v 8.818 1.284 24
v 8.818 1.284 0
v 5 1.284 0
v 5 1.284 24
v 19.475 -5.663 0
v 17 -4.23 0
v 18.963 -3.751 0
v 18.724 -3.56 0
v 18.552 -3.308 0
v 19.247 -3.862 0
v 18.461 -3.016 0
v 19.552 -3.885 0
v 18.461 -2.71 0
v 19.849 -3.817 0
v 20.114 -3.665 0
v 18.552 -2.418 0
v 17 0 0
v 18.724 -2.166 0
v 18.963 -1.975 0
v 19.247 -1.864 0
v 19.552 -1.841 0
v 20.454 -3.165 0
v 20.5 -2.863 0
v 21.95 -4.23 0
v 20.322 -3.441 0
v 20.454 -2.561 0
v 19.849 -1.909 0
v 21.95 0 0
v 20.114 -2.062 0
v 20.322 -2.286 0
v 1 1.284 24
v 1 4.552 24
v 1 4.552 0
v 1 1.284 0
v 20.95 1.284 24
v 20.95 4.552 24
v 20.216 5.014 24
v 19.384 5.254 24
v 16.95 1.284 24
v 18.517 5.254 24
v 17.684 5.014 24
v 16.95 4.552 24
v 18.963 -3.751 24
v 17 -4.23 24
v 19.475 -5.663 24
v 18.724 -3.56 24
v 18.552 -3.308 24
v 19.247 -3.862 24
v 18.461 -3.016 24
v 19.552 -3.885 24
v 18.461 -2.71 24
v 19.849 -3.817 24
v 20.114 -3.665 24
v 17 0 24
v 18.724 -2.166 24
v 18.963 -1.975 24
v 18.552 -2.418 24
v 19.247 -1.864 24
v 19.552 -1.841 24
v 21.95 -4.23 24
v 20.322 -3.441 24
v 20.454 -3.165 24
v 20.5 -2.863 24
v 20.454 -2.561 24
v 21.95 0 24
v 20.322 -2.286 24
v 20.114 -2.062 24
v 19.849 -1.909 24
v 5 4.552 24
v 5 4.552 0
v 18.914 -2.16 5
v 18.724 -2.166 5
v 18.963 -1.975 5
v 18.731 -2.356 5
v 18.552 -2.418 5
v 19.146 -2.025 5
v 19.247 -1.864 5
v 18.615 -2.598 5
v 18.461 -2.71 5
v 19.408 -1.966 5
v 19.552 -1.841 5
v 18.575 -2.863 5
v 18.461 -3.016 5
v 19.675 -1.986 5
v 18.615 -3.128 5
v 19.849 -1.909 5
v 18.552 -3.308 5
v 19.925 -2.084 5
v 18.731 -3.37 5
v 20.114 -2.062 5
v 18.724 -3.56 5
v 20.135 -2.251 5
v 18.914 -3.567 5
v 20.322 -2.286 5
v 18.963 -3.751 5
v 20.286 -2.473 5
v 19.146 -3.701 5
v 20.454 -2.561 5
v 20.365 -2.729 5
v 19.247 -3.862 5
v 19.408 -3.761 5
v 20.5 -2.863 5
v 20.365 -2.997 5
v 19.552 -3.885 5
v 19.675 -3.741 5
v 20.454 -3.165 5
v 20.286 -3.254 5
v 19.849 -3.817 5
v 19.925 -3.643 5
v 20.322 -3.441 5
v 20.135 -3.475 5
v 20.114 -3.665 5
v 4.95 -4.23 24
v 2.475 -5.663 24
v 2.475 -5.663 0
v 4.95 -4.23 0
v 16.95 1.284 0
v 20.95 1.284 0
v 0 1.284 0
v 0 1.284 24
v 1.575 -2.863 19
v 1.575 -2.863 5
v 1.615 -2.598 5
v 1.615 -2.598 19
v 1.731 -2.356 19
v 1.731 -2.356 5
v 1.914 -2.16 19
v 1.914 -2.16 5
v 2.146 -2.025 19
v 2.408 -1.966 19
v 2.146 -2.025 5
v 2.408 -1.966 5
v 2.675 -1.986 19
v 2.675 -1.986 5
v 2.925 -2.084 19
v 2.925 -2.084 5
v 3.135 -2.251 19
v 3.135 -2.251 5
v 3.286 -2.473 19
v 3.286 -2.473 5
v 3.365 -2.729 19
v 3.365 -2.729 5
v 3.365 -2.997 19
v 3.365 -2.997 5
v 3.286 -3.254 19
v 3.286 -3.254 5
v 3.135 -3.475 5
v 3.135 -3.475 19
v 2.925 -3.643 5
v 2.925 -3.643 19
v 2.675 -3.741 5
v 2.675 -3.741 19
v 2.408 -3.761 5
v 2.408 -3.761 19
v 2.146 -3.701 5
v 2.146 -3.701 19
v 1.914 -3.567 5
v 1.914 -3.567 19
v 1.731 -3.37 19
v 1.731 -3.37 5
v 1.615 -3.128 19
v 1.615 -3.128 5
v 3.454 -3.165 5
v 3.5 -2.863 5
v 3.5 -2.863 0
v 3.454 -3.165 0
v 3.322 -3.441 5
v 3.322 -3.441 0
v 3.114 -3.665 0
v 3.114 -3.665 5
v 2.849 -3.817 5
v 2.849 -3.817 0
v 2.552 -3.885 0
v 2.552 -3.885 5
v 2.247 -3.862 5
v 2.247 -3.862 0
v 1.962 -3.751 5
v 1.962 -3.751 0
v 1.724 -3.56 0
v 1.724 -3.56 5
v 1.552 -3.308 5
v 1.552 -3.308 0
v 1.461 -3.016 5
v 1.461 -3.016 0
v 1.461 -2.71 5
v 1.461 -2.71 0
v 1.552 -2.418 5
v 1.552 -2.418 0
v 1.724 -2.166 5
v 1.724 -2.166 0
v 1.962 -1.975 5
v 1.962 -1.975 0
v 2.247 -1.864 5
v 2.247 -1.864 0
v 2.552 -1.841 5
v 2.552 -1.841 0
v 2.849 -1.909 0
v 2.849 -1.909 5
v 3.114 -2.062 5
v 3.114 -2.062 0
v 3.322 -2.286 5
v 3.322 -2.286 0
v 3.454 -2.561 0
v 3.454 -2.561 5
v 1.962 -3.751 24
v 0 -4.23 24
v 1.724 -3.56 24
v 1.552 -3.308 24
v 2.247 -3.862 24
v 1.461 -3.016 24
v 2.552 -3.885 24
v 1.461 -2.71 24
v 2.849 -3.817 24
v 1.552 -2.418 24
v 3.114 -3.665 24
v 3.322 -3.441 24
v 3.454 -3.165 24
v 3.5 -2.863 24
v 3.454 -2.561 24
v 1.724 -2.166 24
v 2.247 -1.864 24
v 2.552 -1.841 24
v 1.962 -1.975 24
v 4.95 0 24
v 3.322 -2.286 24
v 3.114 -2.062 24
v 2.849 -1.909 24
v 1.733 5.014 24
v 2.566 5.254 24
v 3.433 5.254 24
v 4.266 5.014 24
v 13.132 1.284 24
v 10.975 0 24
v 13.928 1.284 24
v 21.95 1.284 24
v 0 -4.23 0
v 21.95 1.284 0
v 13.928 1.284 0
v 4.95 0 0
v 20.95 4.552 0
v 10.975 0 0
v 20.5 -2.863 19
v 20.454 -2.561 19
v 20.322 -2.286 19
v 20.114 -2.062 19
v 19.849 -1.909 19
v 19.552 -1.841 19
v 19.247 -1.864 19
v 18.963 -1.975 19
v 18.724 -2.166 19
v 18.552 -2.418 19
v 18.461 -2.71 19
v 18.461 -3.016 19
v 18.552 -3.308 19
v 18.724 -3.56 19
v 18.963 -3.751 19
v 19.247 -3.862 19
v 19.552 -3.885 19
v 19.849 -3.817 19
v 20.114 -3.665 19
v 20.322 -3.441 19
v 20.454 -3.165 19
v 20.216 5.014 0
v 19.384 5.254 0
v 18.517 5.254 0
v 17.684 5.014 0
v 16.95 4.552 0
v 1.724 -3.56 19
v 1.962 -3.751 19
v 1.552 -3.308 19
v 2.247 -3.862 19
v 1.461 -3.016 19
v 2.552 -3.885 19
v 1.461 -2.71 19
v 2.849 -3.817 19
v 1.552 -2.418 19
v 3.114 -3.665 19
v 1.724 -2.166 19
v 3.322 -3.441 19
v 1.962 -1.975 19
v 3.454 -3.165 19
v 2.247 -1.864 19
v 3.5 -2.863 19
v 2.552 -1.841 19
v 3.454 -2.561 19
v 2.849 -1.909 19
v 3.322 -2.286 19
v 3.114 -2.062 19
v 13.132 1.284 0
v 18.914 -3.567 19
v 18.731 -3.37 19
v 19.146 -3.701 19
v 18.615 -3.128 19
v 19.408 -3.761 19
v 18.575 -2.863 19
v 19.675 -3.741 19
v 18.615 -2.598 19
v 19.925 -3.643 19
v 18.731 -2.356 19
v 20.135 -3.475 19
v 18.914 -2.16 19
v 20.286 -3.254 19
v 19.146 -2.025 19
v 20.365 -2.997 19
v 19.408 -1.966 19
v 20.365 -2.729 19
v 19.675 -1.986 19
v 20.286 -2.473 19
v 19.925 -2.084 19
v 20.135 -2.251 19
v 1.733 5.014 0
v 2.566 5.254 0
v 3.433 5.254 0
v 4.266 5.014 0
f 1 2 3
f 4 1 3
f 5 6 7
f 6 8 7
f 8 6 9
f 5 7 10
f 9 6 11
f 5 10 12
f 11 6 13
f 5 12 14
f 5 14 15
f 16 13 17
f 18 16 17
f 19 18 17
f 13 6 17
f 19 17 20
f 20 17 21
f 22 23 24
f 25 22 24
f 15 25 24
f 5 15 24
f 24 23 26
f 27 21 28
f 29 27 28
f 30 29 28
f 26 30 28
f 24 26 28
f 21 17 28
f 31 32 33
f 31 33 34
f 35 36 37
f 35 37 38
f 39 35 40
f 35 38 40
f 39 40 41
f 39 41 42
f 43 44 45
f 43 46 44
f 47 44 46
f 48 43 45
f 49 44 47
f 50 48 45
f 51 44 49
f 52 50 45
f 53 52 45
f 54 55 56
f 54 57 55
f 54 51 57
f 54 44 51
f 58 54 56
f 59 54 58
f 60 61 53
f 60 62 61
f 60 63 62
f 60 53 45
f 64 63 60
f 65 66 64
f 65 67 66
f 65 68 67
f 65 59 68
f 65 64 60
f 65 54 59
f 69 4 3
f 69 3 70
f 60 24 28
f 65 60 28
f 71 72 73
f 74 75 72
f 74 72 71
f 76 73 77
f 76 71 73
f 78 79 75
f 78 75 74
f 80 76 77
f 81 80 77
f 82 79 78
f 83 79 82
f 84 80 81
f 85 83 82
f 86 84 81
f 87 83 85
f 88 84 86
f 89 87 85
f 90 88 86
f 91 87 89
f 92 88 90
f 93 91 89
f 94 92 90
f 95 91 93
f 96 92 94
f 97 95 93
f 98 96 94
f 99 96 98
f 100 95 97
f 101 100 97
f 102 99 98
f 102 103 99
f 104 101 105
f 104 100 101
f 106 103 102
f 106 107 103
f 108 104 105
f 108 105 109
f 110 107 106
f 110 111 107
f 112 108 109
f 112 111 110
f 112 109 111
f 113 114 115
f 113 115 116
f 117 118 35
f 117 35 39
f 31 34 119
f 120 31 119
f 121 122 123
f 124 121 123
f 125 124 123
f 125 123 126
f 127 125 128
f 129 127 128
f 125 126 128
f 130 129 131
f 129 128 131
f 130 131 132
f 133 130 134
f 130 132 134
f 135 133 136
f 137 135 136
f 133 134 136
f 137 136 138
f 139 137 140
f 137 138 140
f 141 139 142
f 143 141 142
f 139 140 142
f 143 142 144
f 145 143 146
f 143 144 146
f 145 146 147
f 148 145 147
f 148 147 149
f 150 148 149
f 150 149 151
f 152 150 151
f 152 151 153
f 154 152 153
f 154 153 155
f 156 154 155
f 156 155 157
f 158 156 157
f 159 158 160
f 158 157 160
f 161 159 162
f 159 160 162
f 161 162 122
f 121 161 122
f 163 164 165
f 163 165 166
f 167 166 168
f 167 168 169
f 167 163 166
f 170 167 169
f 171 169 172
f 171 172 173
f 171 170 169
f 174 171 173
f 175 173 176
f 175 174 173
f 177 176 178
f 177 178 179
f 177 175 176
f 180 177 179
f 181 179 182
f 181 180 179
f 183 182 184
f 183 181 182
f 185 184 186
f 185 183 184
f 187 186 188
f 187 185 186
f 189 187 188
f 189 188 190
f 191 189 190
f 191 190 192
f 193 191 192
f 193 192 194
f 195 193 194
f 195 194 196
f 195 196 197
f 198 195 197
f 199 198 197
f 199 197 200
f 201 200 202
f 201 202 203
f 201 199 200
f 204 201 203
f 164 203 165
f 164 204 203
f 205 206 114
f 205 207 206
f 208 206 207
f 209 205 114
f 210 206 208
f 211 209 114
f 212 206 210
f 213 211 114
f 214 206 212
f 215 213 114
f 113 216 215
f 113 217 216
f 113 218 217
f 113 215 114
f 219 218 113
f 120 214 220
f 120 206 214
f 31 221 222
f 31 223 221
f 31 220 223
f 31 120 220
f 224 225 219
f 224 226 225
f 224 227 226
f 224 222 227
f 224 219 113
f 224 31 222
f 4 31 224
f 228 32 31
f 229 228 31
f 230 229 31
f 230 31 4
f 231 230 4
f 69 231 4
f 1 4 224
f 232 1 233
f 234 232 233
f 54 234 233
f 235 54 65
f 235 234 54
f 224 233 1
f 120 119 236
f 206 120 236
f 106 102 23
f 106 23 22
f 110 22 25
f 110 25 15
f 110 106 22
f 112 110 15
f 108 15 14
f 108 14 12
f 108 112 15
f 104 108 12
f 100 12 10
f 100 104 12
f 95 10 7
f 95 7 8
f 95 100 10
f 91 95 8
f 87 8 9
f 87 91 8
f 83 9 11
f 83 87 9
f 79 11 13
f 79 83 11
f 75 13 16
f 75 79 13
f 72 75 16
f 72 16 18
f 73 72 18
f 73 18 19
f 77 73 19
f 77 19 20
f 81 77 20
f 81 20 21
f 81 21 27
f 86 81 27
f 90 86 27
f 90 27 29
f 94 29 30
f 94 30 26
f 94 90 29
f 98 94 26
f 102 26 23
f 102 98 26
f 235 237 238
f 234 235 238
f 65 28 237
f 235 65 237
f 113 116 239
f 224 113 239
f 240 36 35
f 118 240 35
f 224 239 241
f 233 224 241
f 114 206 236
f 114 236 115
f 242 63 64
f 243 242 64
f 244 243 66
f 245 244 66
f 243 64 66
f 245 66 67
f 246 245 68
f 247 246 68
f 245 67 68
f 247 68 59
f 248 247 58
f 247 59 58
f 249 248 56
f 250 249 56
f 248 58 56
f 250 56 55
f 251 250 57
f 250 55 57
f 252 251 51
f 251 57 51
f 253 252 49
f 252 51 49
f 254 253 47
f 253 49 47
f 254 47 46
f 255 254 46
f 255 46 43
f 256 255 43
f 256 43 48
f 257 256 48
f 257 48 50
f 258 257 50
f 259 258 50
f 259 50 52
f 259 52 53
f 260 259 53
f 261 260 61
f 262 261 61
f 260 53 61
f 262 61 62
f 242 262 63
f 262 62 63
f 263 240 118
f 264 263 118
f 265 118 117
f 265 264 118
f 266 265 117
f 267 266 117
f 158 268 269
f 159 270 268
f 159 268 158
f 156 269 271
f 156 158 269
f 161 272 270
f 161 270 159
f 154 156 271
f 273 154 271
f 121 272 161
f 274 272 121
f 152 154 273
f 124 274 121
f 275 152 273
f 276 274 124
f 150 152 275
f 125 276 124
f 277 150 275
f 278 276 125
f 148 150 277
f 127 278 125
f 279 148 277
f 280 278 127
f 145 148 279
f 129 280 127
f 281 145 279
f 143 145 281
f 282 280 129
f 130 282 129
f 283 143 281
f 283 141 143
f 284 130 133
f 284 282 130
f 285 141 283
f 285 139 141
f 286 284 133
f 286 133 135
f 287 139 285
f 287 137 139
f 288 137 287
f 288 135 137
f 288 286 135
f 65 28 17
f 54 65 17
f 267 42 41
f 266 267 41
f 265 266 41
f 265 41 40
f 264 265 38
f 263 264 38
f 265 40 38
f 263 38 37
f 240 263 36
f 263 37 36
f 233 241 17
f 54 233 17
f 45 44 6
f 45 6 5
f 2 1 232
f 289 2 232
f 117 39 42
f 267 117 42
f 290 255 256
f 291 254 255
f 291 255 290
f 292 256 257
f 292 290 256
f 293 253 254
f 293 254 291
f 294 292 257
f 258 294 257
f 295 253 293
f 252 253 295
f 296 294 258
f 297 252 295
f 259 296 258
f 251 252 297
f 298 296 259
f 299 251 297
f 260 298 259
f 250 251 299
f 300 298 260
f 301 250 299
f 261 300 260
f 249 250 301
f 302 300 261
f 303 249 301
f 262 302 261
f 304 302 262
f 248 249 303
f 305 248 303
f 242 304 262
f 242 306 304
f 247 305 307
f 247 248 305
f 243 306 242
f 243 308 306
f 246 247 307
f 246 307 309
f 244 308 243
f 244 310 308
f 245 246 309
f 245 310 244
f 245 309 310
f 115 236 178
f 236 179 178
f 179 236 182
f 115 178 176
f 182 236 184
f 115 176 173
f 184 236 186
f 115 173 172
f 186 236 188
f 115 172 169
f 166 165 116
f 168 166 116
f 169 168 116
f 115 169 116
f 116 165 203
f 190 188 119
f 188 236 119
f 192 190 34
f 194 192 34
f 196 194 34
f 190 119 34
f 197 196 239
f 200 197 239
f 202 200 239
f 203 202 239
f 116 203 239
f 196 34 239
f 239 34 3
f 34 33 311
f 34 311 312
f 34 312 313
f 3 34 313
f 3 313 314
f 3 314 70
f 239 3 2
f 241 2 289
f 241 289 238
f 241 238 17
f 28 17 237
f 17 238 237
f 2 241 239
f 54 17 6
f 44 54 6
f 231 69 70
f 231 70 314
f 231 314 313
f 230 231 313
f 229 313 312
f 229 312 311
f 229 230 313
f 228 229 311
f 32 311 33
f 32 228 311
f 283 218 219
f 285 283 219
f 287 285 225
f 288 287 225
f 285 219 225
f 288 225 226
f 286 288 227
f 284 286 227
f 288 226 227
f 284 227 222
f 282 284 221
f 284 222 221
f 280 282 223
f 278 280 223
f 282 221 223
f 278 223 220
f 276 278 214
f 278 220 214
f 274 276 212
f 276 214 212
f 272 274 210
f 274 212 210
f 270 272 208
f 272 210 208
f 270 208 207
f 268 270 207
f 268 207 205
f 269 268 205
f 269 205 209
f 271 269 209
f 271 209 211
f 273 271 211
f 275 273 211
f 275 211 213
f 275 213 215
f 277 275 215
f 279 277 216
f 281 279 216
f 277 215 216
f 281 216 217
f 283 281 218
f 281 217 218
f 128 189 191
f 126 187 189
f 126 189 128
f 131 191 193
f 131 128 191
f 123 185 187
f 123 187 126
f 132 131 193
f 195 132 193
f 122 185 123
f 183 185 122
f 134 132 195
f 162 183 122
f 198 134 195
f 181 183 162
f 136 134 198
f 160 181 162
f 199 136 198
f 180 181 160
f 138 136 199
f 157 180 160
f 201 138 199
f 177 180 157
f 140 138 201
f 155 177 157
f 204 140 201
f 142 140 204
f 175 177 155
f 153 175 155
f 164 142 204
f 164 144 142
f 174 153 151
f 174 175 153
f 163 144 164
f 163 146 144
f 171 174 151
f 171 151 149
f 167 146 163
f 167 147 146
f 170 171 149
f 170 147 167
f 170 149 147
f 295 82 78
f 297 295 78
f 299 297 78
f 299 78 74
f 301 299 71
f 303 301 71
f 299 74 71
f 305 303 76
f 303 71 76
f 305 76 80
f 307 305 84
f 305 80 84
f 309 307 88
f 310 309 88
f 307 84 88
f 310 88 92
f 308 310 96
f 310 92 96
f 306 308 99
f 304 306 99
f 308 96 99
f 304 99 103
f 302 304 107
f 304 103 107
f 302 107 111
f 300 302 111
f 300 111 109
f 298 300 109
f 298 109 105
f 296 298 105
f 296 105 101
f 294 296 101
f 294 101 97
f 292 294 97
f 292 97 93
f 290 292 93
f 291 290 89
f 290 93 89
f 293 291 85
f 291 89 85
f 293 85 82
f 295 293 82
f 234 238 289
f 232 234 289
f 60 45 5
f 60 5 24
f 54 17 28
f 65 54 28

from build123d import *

# Parameters (mm, degrees)
BOSS_EXTRUDE2_DEPTH   = 24
BOSS_EXTRUDE2_2_DEPTH = 24
SKETCH6_R             = 1.025
CUT_EXTRUDE1_DEPTH    = 5
CUT_EXTRUDE2_START    = -5
SKETCH7_R             = 1.025
CUT_EXTRUDE2_DEPTH    = 5
SKETCH8_R             = 0.9
CUT_EXTRUDE3_DEPTH    = 14
CUT_EXTRUDE4_DEPTH    = 24
BOSS_EXTRUDE3_DEPTH   = 24


with BuildPart() as part:
    # Sketch3 → Boss-Extrude2 (new body)
    with BuildSketch(Plane.XY):
        with BuildLine():
            Line((0, 1.284473501), (0, -4.23))
            Line((0, -4.23), (2.475, -5.663169564))
            Line((2.475, -5.663169564), (4.95, -4.23))
            Line((4.95, -4.23), (4.95, 0))
            Line((4.95, 0), (10.974918748, 0))
            Line((10.974918748, 0), (17, -0.000257875))
            Line((17, -0.000257875), (17, 0))
            Line((17, 0), (21.949837505, 0))
            Line((21.949837505, 0), (21.949892461, 1.28400377))
            Line((21.949892461, 1.28400377), (13.928131848, 1.284347104))
            Line((13.928131848, 1.284347104), (13.13155756, 1.284381197))
            Line((13.13155756, 1.284381197), (12.329651428, 1.886055123))
            ThreePointArc((12.329651428, 1.886055123), (12.474649771, 2.499007586), (12.355214929, 3.117449627))
            ThreePointArc((12.355214929, 3.117449627), (10.359172253, 3.897908673), (9.620266793, 1.886113105))
            Line((9.620266793, 1.886113105), (8.81833491, 1.284473501))
            Line((8.81833491, 1.284473501), (0, 1.284473501))
        make_face()
    extrude(amount=BOSS_EXTRUDE2_DEPTH)


with BuildPart() as body_2:
    # Sketch3 → Boss-Extrude2 2 (new body)
    with BuildSketch(Plane.XY):
        Polygon((21.949837485, -0.00046973), (17, -0.000257875), (17, -4.23), (19.475, -5.663169564), (21.95, -4.23), (21.95, 0), (21.949837505, 0), align=None)
    extrude(amount=BOSS_EXTRUDE2_2_DEPTH)


with BuildPart() as cut_extrude1_tool:
    # Sketch6 → Cut-Extrude1 (new body)
    with BuildSketch(Plane.XY.offset(24)):
        with Locations((2.475, -2.863169564)):
            Circle(SKETCH6_R)
        with Locations((19.475, -2.863169564)):
            Circle(SKETCH6_R)
    extrude(amount=-CUT_EXTRUDE1_DEPTH)


with BuildPart() as part_1:
    add(part.part)

    # Cut-Extrude1: cut by cut_extrude1_tool
    add(cut_extrude1_tool.part, mode=Mode.SUBTRACT)


with BuildPart() as body_2_1:
    add(body_2.part)

    # Cut-Extrude1: cut by cut_extrude1_tool
    add(cut_extrude1_tool.part, mode=Mode.SUBTRACT)


with BuildPart() as cut_extrude2_tool:
    # Sketch7 → Cut-Extrude2 (new body)
    with BuildSketch(Plane(origin=(0, 0, 0), x_dir=(-1, 0, 0), z_dir=(0, 0, -1)).offset(CUT_EXTRUDE2_START)):
        with Locations(Location((-19.475, -2.863169564, 0), (0, 0, 180))):
            Circle(SKETCH7_R)
        with Locations(Location((-2.475, -2.863169564, 0), (0, 0, 180))):
            Circle(SKETCH7_R)
    extrude(amount=CUT_EXTRUDE2_DEPTH)


with BuildPart() as part_2:
    add(part_1.part)

    # Cut-Extrude2: cut by cut_extrude2_tool
    add(cut_extrude2_tool.part, mode=Mode.SUBTRACT)


with BuildPart() as body_2_2:
    add(body_2_1.part)

    # Cut-Extrude2: cut by cut_extrude2_tool
    add(cut_extrude2_tool.part, mode=Mode.SUBTRACT)


with BuildPart() as cut_extrude3_tool:
    # Sketch8 → Cut-Extrude3 (new body)
    with BuildSketch(Plane(origin=(0, 0, 5), x_dir=(-1, 0, 0), z_dir=(0, 0, -1))):
        with Locations((-19.475, -2.863169564)):
            Circle(SKETCH8_R)
        with Locations((-2.475, -2.863169564)):
            Circle(SKETCH8_R)
    extrude(amount=-CUT_EXTRUDE3_DEPTH)


with BuildPart() as part_3:
    add(part_2.part)

    # Cut-Extrude3: cut by cut_extrude3_tool
    add(cut_extrude3_tool.part, mode=Mode.SUBTRACT)

    # Sketch9 → Cut-Extrude4 (cut)
    with BuildSketch(Plane.XY.offset(24)):
        Polygon((8.81833491, 1.284473501), (13.13155756, 1.284381197), (13.13155756, 4.431882999), (8.81833491, 4.431882999), align=None)
    extrude(amount=-CUT_EXTRUDE4_DEPTH, mode=Mode.SUBTRACT)

    # Sketch10 → Boss-Extrude3 (add)
    with BuildSketch(Plane.XY.offset(24)):
        with BuildLine():
            Line((0.99983047, 1.284473501), (4.99983047, 1.284473501))
            Line((4.99983047, 1.284473501), (4.99983047, 4.551800372))
            ThreePointArc((4.99983047, 4.551800372), (2.99983047, 5.284473501), (0.99983047, 4.551800372))
            Line((0.99983047, 4.551800372), (0.99983047, 1.284473501))
        make_face()
        with BuildLine():
            Line((20.950061999, 1.284473501), (16.950061999, 1.284473501))
            Line((16.950061999, 1.284473501), (16.950061999, 4.551800372))
            ThreePointArc((16.950061999, 4.551800372), (18.950061999, 5.284473501), (20.950061999, 4.551800372))
            Line((20.950061999, 4.551800372), (20.950061999, 1.284473501))
        make_face()
    extrude(amount=-BOSS_EXTRUDE3_DEPTH)


with BuildPart() as body_2_3:
    add(body_2_2.part)

    # Cut-Extrude3: cut by cut_extrude3_tool
    add(cut_extrude3_tool.part, mode=Mode.SUBTRACT)


with BuildPart() as boss_extrude3_piece_1:
    # of the separate pieces the step leaves, piece 1, a body of its own (boss_extrude3_pieces)
    add(part_3.part.solids().sort_by_distance((8.81833491, 1.284473501, 0))[0])


with BuildPart() as boss_extrude3_piece_2:
    # of the separate pieces the step leaves, piece 2, a body of its own (boss_extrude3_pieces)
    add(part_3.part.solids().sort_by_distance((20.950061999, 1.284473501, 24))[0])


solid = Compound([body_2_3.part, boss_extrude3_piece_1.part, boss_extrude3_piece_2.part])
